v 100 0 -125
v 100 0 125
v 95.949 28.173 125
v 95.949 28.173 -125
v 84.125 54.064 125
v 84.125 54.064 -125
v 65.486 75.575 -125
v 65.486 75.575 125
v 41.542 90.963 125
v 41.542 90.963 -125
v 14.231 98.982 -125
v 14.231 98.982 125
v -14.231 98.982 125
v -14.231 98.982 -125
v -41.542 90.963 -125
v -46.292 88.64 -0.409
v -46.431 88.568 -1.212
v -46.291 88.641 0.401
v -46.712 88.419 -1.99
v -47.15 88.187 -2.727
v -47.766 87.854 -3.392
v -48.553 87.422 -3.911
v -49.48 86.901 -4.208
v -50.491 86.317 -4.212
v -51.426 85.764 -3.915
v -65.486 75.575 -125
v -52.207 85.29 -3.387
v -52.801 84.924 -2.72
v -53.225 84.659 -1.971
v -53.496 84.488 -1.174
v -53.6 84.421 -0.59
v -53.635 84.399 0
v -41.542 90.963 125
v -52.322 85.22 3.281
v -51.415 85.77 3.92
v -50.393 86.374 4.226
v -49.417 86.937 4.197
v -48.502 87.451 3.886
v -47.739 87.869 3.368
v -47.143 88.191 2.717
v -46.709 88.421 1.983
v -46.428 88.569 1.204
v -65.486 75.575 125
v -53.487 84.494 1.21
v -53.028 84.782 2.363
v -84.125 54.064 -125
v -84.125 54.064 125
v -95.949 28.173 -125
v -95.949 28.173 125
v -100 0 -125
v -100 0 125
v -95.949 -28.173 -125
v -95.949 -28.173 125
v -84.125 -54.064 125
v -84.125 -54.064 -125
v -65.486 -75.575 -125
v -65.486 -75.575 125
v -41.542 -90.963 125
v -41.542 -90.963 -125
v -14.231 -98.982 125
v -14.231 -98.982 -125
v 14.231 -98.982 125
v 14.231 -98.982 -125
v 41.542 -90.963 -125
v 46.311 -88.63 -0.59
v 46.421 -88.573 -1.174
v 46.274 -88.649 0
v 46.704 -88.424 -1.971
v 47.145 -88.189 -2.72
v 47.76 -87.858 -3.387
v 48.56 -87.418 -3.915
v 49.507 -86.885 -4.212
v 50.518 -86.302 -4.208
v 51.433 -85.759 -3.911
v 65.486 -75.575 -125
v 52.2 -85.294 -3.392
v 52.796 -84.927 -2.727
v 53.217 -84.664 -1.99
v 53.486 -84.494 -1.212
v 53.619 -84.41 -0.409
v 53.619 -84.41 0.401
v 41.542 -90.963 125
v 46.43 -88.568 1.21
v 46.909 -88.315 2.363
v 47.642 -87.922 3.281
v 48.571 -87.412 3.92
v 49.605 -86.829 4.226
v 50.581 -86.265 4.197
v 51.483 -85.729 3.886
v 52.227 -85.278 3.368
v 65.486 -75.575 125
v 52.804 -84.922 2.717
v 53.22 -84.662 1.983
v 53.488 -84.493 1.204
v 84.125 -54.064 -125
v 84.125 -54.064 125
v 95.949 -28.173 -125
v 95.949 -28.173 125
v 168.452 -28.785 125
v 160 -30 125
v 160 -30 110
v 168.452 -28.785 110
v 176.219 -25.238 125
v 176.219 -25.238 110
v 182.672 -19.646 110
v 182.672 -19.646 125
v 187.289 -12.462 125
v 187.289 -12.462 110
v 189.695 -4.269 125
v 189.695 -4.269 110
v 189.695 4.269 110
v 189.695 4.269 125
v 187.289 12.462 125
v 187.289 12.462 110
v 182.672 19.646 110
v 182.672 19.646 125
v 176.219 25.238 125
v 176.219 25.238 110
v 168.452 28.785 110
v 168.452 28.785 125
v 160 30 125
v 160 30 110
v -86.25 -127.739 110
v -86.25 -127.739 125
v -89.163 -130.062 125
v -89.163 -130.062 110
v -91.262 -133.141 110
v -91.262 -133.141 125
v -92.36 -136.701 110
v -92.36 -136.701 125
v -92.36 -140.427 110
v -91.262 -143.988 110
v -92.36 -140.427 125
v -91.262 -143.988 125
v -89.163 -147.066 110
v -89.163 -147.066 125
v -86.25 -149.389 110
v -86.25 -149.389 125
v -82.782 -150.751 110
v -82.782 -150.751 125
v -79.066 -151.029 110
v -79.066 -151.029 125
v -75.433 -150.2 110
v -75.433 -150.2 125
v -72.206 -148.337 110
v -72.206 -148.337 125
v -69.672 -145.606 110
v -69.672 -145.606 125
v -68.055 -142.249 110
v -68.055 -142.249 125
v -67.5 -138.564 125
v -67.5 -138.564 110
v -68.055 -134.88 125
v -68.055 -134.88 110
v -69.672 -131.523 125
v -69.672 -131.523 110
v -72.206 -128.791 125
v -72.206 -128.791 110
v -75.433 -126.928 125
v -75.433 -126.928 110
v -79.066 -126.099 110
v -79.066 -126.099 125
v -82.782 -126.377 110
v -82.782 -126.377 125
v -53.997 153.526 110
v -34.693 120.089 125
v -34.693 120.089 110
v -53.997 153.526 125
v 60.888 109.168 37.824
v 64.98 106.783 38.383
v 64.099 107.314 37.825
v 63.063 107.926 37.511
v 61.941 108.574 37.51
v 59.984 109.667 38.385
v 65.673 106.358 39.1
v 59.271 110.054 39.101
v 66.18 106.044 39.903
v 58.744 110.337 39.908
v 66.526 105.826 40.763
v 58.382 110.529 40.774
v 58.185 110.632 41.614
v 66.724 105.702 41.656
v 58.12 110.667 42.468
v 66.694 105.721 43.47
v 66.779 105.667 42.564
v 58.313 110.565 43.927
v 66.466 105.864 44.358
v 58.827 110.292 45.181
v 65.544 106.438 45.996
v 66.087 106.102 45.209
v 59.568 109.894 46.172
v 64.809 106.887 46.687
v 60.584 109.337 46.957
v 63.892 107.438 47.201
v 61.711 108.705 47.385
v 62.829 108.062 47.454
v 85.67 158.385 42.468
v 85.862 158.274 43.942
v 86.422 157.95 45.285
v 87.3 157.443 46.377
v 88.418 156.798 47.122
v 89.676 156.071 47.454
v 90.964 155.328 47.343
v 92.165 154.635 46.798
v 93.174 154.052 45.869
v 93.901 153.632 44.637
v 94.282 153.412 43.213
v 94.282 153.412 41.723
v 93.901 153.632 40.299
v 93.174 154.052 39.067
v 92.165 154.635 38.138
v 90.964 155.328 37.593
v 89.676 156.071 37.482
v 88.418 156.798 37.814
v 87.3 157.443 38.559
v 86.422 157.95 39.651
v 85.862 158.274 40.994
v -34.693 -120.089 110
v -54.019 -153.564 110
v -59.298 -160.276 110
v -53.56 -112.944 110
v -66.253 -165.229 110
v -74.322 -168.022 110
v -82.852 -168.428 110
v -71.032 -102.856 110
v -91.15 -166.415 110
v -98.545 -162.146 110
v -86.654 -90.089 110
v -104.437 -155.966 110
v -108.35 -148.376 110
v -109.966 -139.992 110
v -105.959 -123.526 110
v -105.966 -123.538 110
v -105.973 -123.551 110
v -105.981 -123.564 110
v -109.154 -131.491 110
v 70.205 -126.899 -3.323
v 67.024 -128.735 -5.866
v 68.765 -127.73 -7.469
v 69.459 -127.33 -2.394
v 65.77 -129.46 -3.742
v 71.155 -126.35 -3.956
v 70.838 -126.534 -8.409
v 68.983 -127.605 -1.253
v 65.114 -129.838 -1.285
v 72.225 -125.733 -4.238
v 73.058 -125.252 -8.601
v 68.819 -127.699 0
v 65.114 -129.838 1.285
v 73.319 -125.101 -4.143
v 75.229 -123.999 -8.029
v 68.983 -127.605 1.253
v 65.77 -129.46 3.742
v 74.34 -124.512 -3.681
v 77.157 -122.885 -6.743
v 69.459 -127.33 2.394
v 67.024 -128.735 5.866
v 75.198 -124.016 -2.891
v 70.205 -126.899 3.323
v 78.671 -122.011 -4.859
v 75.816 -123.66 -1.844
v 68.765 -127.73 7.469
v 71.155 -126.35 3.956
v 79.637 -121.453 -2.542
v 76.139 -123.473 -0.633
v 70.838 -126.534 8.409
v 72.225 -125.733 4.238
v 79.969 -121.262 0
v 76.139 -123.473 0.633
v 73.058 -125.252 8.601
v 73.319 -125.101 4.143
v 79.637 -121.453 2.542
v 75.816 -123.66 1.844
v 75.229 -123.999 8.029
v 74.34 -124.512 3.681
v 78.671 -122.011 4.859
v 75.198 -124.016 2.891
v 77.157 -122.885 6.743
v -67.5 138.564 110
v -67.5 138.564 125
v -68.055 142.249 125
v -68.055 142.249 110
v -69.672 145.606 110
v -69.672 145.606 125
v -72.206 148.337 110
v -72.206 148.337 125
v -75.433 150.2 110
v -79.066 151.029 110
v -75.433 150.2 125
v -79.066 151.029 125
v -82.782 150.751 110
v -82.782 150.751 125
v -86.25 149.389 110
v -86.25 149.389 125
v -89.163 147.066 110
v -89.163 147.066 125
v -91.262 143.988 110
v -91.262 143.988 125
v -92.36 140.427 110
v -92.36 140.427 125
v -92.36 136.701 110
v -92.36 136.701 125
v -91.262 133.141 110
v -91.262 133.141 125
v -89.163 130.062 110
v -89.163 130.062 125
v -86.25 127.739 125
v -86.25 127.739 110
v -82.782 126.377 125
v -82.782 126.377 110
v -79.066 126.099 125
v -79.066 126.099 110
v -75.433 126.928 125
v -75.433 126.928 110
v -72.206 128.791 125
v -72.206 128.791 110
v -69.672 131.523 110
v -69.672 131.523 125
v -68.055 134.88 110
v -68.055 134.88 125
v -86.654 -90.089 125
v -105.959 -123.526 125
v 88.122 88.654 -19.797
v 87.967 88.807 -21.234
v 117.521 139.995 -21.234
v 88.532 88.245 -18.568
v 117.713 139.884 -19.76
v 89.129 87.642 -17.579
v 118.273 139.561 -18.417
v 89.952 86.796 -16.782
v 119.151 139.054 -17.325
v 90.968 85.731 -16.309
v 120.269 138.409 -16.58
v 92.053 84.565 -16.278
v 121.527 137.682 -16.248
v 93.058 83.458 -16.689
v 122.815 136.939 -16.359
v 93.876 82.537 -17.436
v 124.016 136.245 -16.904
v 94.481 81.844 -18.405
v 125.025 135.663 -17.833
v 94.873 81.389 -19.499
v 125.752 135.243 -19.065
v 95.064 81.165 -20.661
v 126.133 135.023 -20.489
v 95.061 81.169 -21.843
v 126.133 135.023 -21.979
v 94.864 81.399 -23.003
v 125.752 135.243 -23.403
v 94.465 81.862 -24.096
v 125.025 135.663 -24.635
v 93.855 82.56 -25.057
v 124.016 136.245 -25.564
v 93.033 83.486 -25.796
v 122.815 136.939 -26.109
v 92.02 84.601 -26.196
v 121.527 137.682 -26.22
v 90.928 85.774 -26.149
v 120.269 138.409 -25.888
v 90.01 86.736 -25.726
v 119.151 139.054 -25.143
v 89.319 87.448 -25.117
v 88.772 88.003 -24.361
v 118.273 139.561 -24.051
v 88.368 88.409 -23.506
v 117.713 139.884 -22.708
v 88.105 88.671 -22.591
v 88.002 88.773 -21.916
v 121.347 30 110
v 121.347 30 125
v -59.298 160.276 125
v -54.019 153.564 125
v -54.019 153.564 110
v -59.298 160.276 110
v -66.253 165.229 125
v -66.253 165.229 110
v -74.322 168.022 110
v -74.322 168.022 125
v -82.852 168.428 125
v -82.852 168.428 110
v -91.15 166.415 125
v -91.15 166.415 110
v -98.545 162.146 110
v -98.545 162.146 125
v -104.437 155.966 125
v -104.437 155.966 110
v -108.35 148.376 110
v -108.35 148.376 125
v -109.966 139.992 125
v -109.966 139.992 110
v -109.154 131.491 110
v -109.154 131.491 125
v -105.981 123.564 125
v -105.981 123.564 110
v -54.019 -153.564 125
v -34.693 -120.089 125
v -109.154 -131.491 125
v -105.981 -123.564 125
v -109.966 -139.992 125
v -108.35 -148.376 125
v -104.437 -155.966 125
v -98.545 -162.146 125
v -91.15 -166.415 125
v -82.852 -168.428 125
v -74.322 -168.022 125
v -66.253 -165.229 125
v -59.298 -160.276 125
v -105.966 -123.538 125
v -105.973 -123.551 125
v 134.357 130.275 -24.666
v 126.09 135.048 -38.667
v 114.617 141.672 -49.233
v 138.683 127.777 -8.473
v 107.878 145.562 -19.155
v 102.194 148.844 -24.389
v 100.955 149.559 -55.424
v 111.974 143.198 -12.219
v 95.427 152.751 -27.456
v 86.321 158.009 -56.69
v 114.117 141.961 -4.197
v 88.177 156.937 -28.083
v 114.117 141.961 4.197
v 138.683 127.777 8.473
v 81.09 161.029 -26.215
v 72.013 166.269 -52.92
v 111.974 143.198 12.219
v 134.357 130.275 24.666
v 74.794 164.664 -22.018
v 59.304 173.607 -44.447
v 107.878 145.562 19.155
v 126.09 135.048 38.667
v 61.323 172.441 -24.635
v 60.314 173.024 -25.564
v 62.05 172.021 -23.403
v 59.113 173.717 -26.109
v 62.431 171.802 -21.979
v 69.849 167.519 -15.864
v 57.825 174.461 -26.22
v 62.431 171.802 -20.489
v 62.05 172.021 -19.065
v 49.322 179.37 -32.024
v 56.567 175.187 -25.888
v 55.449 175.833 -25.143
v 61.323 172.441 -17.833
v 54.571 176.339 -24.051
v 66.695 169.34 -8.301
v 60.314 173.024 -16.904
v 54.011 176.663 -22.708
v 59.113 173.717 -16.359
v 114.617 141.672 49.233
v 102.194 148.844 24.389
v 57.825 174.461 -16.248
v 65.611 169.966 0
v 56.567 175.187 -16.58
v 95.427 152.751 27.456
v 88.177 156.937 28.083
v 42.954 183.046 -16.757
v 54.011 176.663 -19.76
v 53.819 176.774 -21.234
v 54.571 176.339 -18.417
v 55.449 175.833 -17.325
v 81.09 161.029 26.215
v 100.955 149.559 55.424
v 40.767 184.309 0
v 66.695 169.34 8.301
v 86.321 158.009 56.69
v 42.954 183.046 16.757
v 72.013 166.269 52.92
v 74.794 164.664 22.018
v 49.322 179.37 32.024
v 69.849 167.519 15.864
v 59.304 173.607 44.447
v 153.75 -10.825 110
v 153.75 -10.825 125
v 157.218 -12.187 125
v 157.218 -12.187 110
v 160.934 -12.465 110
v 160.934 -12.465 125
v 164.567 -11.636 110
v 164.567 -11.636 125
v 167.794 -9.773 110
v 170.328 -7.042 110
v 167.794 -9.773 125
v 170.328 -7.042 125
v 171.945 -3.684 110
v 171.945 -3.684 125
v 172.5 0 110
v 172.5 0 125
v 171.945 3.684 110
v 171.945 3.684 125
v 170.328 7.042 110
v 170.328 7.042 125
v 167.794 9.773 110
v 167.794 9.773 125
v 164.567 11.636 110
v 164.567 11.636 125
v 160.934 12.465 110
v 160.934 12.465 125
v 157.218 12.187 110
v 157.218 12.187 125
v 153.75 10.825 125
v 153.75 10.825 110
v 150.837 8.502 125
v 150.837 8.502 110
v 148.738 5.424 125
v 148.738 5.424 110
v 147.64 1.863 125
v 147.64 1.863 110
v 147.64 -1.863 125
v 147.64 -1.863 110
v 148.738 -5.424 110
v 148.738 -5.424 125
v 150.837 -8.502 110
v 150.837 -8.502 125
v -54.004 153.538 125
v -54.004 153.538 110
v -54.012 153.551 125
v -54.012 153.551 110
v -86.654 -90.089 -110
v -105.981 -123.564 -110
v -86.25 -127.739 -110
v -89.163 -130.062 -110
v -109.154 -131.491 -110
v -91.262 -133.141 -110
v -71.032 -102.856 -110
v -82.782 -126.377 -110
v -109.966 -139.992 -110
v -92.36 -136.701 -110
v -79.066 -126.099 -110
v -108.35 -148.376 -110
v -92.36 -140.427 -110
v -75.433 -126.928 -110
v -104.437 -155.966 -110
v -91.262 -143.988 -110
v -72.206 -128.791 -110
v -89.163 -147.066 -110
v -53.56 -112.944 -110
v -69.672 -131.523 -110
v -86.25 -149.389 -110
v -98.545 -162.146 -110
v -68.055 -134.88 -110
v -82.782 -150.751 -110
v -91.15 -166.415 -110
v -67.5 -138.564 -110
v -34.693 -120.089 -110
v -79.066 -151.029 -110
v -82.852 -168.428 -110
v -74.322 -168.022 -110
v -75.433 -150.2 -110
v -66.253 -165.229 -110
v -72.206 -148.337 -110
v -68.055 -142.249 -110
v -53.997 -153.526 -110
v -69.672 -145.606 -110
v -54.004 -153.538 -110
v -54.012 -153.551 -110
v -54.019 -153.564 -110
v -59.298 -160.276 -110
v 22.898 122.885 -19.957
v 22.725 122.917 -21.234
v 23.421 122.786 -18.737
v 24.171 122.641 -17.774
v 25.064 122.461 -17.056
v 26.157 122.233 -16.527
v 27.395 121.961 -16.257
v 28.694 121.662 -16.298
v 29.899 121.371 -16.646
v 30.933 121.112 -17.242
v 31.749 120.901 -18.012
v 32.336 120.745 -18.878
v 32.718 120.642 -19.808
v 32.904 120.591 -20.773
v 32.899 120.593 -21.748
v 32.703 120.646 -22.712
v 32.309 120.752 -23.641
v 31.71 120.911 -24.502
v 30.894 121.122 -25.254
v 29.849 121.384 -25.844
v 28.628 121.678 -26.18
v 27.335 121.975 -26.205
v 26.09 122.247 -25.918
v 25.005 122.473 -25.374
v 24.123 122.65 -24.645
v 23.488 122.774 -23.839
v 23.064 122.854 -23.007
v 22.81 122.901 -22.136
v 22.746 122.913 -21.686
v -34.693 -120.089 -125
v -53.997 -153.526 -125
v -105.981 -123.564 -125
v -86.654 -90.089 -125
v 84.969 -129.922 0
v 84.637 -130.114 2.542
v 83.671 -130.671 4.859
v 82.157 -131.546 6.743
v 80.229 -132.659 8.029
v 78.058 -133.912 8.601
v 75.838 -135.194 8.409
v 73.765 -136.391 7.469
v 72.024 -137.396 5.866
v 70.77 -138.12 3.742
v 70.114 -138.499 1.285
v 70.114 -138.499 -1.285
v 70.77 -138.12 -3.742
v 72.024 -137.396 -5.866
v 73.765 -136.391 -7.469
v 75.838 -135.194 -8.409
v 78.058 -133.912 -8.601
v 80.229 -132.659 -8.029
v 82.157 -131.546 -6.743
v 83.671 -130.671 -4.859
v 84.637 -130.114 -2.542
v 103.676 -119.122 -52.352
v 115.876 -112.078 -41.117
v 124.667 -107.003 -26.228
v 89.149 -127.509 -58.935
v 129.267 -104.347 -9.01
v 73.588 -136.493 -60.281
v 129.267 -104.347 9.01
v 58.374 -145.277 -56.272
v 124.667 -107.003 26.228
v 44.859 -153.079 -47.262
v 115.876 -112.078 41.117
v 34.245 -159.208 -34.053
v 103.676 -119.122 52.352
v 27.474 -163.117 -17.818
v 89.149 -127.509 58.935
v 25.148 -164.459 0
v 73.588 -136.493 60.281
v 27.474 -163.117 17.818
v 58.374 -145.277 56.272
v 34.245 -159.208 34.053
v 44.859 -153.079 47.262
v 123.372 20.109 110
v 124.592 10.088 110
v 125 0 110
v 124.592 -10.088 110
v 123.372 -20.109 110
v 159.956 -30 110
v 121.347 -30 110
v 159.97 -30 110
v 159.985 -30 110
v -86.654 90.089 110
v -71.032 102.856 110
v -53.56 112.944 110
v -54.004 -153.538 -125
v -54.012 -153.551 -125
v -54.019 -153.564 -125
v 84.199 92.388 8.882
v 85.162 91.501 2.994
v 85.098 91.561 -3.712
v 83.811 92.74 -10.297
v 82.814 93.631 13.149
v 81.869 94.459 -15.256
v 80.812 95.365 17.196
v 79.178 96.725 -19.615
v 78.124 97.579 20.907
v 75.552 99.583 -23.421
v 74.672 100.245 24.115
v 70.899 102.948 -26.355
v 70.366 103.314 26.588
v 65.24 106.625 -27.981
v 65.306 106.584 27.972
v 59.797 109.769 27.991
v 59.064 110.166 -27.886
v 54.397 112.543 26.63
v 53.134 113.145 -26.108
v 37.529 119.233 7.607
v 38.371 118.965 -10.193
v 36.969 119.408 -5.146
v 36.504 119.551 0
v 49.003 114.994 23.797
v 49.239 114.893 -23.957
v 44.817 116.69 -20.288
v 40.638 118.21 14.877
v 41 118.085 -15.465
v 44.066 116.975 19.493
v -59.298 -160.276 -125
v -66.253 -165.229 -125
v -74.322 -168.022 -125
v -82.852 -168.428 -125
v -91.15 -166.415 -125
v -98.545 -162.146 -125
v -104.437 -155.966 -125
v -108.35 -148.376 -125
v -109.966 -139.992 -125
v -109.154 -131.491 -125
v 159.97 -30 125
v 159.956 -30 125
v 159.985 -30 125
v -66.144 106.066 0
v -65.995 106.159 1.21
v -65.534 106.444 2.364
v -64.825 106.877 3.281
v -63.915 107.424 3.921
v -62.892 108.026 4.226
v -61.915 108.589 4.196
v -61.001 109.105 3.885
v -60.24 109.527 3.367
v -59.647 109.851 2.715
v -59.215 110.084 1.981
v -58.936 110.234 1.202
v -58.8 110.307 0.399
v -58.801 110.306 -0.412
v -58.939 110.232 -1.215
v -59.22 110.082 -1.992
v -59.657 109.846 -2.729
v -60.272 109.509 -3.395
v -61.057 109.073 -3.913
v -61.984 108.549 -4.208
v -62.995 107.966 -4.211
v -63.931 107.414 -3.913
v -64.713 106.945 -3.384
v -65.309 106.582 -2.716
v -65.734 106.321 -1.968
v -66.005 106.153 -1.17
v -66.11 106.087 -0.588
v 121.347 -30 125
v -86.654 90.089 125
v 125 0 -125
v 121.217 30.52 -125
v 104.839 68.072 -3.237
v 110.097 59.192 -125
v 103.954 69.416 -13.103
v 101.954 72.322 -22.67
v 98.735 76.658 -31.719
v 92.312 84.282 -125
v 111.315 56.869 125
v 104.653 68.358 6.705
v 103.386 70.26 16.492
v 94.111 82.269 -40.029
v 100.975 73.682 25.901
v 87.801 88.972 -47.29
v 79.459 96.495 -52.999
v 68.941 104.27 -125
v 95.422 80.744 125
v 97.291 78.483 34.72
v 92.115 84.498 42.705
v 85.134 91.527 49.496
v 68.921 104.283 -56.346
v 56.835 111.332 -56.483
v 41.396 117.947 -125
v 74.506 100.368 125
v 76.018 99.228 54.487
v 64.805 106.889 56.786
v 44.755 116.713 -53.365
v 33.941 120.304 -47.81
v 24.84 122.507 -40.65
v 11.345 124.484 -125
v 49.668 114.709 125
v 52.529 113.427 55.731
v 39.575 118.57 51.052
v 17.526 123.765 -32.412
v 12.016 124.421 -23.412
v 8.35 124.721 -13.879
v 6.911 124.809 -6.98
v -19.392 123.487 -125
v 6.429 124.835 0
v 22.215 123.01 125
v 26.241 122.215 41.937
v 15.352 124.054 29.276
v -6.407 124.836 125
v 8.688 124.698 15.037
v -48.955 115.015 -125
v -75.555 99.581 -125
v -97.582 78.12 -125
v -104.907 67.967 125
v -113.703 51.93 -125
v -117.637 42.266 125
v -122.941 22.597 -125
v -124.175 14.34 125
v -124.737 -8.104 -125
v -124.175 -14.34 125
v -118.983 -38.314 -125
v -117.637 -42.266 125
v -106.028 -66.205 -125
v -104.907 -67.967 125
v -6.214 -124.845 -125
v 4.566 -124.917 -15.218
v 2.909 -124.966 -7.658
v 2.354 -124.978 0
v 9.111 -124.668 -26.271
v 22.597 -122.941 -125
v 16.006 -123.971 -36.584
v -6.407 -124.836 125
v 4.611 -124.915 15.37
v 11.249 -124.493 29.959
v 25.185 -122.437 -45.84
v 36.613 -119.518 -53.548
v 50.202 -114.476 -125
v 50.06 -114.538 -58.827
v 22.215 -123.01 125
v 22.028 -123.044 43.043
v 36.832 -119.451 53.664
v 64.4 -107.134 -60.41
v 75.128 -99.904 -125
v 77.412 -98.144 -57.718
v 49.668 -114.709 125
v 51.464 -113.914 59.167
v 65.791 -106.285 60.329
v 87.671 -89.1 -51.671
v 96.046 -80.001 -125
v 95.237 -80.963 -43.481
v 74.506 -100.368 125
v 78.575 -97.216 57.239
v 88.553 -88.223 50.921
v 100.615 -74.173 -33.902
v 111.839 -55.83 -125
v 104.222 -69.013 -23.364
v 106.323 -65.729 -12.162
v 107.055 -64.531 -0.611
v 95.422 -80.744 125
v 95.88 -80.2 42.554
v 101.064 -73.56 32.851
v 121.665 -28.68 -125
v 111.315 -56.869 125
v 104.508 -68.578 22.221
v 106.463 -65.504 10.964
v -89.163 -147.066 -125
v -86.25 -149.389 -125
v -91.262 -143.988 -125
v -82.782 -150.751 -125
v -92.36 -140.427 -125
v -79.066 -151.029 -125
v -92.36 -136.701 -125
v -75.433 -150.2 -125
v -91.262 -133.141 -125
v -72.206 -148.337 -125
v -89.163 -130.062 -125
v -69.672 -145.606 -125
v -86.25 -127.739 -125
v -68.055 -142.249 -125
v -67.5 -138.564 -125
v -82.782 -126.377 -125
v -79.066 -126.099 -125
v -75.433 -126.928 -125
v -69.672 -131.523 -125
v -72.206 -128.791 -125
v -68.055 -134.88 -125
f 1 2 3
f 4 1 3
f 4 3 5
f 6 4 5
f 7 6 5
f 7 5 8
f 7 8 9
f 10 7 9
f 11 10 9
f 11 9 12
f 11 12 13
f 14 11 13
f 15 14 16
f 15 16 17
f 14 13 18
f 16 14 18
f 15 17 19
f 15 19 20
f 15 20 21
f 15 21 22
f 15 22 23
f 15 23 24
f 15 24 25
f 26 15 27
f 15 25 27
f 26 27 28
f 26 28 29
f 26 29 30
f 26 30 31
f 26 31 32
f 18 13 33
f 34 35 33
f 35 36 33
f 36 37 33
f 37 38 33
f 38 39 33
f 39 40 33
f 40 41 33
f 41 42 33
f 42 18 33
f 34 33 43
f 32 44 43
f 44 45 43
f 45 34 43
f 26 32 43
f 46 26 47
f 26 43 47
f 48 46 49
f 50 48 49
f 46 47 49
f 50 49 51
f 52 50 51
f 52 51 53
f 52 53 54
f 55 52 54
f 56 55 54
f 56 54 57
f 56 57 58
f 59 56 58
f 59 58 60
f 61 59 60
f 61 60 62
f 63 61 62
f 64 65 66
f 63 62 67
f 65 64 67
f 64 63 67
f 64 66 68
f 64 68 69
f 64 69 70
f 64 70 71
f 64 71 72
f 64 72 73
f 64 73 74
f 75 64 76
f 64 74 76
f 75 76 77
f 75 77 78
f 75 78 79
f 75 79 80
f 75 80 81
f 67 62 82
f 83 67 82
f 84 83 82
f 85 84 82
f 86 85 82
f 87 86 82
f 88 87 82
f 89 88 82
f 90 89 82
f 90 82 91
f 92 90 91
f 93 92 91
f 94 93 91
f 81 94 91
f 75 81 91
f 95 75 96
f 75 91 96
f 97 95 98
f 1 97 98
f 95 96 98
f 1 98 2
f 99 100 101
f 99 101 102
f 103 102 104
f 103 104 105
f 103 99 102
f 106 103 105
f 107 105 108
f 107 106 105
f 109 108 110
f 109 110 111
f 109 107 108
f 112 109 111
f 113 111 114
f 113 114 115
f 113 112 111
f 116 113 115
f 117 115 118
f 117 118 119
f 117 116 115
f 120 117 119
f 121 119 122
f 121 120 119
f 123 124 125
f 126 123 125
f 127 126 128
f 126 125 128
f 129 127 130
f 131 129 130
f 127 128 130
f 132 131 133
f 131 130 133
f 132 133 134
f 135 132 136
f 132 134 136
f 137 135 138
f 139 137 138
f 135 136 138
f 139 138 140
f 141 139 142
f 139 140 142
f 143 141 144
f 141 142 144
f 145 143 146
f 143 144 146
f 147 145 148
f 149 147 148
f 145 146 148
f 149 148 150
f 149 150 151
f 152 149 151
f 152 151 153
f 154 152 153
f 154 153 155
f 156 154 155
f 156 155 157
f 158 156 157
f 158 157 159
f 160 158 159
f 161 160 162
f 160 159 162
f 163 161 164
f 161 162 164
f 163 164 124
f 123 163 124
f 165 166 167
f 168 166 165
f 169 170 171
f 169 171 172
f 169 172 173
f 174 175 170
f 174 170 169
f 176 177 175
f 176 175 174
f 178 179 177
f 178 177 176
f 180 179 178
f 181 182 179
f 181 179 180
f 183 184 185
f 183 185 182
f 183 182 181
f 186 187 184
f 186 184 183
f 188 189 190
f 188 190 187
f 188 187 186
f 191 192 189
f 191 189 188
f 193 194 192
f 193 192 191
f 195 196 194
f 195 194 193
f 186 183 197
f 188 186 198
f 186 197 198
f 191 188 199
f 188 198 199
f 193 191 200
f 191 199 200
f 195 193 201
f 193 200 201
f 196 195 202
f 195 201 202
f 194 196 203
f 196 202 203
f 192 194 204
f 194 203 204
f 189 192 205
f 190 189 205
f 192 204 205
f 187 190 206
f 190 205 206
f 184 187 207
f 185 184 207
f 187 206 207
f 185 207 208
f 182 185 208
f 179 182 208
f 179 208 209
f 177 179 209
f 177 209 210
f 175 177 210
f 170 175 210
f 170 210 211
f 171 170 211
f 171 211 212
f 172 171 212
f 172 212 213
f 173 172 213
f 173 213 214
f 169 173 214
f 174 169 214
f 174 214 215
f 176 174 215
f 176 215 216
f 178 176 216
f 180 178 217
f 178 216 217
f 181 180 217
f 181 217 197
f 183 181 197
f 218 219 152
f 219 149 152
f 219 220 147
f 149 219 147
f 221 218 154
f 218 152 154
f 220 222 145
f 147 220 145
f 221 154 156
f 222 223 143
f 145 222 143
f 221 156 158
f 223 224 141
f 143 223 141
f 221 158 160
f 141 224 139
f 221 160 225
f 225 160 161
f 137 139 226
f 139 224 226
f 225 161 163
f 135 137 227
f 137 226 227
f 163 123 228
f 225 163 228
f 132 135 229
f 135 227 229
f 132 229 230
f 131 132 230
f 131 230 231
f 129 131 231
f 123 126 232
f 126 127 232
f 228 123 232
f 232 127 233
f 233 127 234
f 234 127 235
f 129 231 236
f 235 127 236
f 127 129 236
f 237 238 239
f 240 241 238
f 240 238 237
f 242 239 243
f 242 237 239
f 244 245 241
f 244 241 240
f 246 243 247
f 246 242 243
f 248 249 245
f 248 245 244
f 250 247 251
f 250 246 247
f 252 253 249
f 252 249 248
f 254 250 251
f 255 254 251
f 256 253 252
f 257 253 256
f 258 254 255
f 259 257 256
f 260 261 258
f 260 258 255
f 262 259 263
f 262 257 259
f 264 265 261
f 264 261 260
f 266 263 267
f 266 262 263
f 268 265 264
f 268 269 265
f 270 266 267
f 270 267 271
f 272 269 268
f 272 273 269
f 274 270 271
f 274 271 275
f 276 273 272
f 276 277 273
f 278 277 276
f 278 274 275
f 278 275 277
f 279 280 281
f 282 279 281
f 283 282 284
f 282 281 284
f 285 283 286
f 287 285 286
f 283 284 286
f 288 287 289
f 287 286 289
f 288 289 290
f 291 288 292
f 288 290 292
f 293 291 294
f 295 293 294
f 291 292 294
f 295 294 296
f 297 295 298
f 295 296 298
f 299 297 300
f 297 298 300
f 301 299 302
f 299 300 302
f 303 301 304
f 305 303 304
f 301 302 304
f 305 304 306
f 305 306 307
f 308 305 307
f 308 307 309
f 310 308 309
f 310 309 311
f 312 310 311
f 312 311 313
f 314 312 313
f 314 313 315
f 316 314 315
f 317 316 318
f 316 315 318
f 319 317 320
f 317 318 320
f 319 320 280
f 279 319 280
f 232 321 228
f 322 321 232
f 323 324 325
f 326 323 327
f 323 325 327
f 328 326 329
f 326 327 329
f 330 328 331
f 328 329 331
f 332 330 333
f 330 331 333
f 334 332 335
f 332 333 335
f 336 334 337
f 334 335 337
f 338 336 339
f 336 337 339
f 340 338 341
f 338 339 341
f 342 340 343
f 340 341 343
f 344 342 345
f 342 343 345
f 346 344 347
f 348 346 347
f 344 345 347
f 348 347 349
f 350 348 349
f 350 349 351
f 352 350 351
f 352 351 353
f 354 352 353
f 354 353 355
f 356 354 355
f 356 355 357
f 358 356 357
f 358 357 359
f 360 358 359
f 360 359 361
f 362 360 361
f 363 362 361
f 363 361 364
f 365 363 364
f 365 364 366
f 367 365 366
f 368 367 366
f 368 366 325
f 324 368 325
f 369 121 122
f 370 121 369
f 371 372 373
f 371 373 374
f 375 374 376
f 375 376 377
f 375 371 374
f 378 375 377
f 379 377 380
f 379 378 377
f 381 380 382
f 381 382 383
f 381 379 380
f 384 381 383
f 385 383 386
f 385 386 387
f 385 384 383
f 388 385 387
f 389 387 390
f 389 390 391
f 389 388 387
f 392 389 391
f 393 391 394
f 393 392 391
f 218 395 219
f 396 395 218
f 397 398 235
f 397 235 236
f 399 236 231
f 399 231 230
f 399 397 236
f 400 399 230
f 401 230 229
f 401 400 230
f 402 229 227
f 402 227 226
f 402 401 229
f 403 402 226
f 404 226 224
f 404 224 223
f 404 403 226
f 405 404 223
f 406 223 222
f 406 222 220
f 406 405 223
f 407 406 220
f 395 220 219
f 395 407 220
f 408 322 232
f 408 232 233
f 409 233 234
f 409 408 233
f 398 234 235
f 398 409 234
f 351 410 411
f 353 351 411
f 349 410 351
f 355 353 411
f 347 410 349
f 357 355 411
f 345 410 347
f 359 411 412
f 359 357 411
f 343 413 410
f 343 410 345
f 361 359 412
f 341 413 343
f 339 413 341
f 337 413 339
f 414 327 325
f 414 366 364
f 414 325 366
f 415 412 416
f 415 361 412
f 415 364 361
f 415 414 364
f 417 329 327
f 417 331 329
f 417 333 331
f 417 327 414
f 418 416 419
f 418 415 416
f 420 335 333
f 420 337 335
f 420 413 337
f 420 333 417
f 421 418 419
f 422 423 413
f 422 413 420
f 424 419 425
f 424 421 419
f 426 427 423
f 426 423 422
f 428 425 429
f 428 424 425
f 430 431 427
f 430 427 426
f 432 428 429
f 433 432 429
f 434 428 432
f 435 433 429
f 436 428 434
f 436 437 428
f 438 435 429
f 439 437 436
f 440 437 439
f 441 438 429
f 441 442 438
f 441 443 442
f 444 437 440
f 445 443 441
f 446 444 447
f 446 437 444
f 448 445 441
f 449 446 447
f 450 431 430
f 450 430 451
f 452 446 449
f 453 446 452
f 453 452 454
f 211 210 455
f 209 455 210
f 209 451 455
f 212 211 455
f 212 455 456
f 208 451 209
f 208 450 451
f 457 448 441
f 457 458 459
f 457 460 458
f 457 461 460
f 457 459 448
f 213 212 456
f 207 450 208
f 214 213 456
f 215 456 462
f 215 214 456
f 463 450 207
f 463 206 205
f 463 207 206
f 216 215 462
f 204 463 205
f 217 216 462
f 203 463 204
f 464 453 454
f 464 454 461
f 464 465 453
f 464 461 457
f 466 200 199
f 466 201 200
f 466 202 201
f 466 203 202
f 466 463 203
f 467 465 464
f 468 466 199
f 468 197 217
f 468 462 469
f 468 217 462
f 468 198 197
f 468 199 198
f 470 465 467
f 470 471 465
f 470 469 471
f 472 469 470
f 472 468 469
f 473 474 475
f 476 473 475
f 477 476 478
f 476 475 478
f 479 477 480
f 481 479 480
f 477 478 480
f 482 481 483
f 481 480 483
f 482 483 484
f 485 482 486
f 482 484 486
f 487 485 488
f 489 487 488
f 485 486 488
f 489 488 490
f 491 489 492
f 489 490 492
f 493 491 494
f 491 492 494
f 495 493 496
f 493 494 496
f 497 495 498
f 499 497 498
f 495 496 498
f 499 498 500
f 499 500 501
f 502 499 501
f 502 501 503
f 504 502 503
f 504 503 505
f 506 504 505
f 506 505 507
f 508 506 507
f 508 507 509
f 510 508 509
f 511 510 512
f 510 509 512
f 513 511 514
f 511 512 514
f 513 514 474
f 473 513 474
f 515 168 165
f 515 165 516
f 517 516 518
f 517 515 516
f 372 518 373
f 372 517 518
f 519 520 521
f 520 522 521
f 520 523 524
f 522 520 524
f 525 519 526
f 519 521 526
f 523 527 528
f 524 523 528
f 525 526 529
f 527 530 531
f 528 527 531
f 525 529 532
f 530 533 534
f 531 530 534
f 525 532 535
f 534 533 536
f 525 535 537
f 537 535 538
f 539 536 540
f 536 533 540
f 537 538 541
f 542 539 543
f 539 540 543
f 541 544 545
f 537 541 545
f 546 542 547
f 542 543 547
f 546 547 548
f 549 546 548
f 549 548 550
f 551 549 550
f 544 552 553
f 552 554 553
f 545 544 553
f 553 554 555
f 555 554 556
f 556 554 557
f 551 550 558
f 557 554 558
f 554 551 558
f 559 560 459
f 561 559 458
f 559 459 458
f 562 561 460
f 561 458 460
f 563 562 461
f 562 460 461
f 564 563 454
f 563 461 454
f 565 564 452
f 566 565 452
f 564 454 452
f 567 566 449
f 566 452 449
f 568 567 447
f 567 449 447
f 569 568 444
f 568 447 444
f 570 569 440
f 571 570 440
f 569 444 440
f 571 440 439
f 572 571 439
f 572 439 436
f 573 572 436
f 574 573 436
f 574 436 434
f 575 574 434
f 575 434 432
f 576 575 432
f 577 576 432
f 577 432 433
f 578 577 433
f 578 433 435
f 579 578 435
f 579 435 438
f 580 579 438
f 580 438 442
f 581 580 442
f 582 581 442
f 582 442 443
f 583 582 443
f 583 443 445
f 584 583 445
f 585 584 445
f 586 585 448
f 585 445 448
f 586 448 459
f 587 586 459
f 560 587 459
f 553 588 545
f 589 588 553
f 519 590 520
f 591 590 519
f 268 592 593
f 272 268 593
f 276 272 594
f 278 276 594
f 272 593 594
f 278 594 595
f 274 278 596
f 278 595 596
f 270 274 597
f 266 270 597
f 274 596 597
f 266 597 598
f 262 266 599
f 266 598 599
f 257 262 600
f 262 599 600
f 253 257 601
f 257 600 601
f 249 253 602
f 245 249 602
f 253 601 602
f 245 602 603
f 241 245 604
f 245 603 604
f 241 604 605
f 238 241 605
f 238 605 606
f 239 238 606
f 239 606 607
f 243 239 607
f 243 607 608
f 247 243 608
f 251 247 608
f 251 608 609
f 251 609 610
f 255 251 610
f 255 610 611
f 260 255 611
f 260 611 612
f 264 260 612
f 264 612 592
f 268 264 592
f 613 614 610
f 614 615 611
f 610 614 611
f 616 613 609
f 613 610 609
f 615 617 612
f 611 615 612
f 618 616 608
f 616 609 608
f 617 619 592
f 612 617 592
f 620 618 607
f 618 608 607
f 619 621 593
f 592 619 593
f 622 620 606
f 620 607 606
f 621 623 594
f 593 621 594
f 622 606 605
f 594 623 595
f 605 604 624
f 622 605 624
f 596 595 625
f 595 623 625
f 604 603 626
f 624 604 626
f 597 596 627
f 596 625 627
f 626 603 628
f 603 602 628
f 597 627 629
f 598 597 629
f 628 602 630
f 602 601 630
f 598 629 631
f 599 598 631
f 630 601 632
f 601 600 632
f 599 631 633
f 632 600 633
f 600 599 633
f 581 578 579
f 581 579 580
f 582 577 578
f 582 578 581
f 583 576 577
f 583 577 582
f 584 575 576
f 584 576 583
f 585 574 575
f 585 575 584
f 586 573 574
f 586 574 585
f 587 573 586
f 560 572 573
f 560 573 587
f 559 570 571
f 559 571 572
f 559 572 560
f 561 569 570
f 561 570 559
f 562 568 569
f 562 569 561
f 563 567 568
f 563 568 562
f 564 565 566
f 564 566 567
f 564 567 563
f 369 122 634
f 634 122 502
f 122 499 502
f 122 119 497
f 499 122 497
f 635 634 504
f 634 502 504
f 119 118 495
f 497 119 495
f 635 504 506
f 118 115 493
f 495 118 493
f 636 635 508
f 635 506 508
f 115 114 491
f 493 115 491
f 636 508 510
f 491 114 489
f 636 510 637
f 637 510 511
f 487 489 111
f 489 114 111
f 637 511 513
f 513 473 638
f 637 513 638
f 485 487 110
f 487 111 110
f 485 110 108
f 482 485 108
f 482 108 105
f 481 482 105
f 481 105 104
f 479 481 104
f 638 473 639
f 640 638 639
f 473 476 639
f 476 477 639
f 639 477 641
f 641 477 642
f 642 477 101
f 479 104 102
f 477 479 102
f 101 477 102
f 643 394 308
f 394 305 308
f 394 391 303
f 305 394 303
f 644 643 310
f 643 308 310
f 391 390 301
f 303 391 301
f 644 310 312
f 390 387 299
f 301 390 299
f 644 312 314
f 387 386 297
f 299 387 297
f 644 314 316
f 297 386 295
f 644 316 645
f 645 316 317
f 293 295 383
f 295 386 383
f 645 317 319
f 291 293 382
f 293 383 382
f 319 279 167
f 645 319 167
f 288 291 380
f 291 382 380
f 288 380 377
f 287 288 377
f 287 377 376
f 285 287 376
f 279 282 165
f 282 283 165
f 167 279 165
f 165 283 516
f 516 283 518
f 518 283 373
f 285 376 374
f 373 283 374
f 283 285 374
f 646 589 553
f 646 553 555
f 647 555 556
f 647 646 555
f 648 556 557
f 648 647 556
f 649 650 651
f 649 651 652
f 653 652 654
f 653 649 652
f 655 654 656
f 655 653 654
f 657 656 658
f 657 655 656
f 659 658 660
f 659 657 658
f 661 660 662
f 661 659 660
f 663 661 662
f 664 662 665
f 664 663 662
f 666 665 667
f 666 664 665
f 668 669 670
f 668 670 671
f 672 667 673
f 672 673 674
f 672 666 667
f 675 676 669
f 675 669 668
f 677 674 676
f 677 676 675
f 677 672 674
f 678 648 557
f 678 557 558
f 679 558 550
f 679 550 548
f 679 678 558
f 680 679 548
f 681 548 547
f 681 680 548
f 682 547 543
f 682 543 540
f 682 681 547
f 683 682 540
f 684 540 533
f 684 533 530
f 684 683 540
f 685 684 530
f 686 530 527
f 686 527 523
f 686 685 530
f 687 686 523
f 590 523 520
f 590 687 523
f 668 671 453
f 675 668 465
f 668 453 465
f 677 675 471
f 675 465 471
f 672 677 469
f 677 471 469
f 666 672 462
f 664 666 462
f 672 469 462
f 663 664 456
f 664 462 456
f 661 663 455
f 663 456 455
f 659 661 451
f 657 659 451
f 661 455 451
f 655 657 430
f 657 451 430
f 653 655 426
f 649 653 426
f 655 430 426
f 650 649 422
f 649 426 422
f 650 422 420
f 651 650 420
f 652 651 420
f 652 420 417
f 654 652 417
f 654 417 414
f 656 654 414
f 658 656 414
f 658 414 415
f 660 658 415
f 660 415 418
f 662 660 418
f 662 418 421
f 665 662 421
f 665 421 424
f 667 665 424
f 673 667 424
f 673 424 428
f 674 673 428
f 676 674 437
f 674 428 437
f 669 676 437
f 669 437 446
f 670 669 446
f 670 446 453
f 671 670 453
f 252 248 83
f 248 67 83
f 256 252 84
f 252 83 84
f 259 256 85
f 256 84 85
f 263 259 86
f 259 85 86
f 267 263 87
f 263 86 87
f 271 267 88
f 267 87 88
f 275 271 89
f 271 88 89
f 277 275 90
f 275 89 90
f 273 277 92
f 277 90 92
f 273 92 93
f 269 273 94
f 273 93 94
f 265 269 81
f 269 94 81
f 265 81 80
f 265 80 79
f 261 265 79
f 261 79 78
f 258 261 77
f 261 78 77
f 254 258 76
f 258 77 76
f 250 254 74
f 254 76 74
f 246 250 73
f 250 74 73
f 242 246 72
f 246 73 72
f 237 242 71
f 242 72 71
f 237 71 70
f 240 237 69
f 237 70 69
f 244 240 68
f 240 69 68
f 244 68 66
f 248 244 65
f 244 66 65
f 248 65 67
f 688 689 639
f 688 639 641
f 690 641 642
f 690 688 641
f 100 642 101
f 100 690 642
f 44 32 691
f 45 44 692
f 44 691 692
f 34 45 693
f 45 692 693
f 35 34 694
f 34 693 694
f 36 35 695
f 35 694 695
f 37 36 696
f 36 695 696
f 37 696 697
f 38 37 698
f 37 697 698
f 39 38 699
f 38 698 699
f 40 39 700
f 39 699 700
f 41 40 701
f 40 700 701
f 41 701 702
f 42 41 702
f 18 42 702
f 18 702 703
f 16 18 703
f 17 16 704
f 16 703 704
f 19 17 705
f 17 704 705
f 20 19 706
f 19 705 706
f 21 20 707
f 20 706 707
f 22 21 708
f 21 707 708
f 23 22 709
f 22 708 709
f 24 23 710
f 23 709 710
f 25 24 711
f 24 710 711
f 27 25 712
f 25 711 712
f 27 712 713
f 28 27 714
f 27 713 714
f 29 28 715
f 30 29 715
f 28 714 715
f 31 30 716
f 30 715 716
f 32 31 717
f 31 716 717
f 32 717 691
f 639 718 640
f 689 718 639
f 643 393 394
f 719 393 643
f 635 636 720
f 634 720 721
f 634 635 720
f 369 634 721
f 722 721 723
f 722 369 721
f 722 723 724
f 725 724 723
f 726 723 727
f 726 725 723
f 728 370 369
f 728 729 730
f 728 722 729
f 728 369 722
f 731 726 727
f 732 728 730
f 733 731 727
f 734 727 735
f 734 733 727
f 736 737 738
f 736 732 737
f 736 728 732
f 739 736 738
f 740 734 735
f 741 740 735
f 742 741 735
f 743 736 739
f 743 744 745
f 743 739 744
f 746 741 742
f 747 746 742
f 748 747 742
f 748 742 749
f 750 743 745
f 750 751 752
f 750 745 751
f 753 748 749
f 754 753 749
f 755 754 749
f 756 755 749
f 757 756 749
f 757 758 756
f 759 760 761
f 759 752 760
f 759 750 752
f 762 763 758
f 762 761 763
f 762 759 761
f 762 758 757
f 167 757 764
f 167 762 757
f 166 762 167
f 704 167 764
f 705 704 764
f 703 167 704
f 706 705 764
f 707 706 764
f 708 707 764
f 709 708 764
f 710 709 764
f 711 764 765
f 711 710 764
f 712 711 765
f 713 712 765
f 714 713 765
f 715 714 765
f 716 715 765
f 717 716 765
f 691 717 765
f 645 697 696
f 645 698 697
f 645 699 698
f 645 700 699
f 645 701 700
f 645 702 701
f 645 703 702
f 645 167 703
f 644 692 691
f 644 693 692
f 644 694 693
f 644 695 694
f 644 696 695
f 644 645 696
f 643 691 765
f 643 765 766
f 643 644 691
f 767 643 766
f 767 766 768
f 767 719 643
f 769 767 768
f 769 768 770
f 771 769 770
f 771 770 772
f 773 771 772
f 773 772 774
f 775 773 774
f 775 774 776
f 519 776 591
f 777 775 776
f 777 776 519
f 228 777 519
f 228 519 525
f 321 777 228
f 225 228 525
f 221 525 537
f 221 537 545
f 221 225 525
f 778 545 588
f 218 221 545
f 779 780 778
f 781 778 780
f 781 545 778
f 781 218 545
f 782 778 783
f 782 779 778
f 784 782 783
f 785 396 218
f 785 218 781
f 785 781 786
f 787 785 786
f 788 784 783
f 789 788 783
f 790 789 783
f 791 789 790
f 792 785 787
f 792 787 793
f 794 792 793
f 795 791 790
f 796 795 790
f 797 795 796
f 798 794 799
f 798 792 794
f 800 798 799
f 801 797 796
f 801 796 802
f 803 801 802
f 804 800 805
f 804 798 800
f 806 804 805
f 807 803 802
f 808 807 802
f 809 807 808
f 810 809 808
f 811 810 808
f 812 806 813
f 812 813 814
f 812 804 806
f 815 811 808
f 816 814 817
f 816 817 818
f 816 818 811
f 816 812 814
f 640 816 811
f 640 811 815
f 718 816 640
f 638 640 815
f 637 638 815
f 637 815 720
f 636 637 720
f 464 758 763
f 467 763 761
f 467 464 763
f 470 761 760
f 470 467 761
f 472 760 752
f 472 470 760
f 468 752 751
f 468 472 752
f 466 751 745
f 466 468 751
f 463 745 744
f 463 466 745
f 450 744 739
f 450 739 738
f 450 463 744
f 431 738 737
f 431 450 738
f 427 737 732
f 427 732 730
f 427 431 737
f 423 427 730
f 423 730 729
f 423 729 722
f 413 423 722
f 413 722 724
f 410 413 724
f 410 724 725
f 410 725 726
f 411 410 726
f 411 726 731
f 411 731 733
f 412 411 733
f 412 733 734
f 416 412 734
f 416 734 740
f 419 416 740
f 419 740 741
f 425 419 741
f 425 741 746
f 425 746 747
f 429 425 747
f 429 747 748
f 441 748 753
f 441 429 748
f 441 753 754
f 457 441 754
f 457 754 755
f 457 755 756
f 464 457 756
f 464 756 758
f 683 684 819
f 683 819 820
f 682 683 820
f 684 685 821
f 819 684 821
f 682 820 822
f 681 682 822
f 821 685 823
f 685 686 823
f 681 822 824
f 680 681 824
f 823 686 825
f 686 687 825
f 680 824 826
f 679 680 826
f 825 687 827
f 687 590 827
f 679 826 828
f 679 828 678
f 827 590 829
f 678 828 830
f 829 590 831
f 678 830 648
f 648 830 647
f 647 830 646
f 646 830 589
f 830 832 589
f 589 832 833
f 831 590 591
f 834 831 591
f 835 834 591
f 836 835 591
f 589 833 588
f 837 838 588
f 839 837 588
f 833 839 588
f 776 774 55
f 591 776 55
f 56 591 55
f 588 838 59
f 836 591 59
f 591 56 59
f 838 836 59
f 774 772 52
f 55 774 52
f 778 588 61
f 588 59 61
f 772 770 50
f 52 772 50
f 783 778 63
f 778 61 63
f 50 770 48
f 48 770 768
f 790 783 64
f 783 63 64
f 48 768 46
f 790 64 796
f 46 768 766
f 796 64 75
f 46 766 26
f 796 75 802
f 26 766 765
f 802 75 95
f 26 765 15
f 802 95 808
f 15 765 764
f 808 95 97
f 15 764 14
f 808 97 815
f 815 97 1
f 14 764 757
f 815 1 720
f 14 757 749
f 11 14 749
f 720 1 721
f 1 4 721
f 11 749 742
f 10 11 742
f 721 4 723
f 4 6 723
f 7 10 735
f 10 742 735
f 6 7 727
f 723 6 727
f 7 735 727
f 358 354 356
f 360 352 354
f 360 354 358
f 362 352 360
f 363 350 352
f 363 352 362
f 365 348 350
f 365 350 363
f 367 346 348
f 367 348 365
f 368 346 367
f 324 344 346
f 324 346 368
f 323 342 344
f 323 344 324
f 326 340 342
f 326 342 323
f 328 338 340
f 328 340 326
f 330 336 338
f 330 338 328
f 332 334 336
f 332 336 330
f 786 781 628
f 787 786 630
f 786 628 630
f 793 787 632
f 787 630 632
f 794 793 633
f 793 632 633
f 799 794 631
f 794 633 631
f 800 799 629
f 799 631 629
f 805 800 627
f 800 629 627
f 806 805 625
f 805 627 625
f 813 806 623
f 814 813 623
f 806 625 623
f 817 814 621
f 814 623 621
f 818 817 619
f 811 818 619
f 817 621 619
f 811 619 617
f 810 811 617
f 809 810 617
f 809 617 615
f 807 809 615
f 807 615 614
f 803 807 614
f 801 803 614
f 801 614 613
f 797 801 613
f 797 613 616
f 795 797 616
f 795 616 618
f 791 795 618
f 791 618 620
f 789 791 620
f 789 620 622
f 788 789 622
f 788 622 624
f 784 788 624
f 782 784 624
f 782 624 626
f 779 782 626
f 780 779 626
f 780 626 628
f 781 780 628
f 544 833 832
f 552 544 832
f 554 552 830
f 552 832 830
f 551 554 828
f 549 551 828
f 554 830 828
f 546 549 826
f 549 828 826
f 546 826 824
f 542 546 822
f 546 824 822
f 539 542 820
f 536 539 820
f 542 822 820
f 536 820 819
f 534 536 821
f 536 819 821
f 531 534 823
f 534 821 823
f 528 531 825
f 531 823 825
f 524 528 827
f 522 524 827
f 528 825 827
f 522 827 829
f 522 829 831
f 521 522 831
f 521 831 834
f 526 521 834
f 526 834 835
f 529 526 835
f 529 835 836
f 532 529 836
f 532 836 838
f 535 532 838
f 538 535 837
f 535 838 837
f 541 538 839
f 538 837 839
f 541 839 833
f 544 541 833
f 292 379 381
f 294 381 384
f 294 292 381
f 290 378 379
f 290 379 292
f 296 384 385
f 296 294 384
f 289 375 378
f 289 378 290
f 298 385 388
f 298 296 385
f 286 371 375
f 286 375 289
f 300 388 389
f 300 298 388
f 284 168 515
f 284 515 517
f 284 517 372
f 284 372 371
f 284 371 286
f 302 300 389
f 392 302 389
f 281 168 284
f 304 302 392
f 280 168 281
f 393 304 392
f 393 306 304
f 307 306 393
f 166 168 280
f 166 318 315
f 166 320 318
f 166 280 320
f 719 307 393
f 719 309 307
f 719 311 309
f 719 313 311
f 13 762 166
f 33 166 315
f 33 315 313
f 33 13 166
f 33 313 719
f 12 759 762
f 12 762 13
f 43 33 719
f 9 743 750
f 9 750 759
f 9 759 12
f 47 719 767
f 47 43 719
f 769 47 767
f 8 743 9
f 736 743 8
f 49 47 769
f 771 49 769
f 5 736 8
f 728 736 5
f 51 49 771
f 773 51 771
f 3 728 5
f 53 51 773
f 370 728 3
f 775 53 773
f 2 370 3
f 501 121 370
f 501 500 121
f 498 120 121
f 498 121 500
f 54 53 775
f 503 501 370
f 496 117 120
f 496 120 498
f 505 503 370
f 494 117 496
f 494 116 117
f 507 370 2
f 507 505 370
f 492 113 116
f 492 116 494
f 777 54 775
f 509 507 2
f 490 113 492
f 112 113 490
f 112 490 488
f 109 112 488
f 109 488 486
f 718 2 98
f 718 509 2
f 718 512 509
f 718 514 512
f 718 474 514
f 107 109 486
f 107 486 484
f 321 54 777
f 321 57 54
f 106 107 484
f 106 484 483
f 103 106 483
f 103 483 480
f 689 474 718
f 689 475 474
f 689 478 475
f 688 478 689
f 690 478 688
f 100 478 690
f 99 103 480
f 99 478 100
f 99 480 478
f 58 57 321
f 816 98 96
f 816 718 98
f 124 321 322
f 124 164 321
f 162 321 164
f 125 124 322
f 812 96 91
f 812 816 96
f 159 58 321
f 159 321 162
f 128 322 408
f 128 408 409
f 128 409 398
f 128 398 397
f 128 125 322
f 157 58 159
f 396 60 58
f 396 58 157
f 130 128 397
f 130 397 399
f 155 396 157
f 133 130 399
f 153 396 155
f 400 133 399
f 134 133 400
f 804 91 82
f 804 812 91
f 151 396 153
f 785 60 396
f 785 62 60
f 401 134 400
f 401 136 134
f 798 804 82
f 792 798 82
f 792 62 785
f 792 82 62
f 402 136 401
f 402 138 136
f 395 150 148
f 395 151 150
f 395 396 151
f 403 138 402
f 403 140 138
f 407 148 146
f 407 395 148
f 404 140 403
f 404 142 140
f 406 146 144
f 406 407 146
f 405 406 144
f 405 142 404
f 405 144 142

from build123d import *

# Parameters (mm, degrees)
F1_R             = 125
F1_R_2           = 100
F2_DEPTH         = 250
F3_R             = 12.5
F4_DEPTH         = 15
F4_COPIES_COUNT  = 3
F4_COPIES1_COUNT = 2
F10_R            = 56.8493867215
F10_R_2          = 5
F10_R_3          = 28.1619206838
F11_DEPTH        = 68.6754869442
F15_R            = 60.4503373428
F18_D            = 8.5
F18_CBORE_D      = 17.25
F18_CBORE_DEPTH  = 10


# Not quite as in the source:
# - ends of sketch curves that miss each other by under 0.0002 mm in the source are joined
# - a pattern or mirror of a feature is missing from the dataset's text; its kind, count and spacing are read off the source's solid


with BuildPart() as f2:
    # F1 (on offset) → F2 (new body)
    with BuildSketch(Plane.XY.offset(125)):
        Circle(F1_R)
        Circle(F1_R_2, mode=Mode.SUBTRACT)
    extrude(amount=-F2_DEPTH)

    # F3 (on face) → F4 (join)
    with BuildSketch(Plane.XY.offset(125)):
        with BuildLine():
            Line((-105.9807621135, 123.5640646055), (-86.6540676111, 90.0892477849))
            ThreePointArc((-86.6540676111, 90.0892477849), (-62.5, 108.2531754731), (-34.692543384, 120.0892477849))
            Line((-34.692543384, 120.0892477849), (-53.9970505647, 153.5256350369))
            ThreePointArc((-53.9970505647, 153.5256350369), (-54.008151328, 153.5448457136), (-54.0192378865, 153.5640646055))
            ThreePointArc((-54.0192378865, 153.5640646055), (-95, 164.544826719), (-105.9807621135, 123.5640646055))
        make_face()
        with Locations((-80, 138.5640646055)):
            Circle(F3_R, mode=Mode.SUBTRACT)
    f4 = extrude(amount=-F4_DEPTH)

    # F4_copies: F4 ×3 about axis
    f4_copies_axis = Axis((0, 0, 0), (0, 0, 1))
    for i in range(1, F4_COPIES_COUNT):
        add(f4.rotate(f4_copies_axis, i * 360 / F4_COPIES_COUNT))

    # F4_copies1: F4 ×2 about axis
    f4_copies1_axis = Axis((0, 0, 0), (1, 0, 0))
    for i in range(1, F4_COPIES1_COUNT):
        add(f4.rotate(f4_copies1_axis, i * 360 / F4_COPIES1_COUNT))

    # F10 (on offset) → F11 (join, through all)
    with BuildSketch(Plane(origin=(90, 155.8845726812, 0), x_dir=(-0.8660254038, 0.5, 0), z_dir=(0.5, 0.8660254038, 0))):
        Circle(F10_R)
        with Locations((-36.7784088222, -21.2340242338)):
            Circle(F10_R_2, mode=Mode.SUBTRACT)
        with Locations((36.7784088222, -21.2340242338)):
            Circle(F10_R_2, mode=Mode.SUBTRACT)
        Circle(F10_R_3, mode=Mode.SUBTRACT)
        with Locations((0, 42.4680484677)):
            Circle(F10_R_2, mode=Mode.SUBTRACT)
    extrude(amount=-F11_DEPTH)

    # F15 (on offset) → F16 (join, up to the next surface of F2)
    with BuildSketch(Plane(origin=(77.4998450043, -134.2344088806, 0), x_dir=(-0.8660265969, -0.4999979334, 0), z_dir=(-0.4999979334, 0.8660265969, 0))):
        Circle(F15_R)
    extrude(until=Until.NEXT)

    # F18 (through all)
    with Locations(Plane(origin=(77.4998450043, -134.2344088806, 0), x_dir=(0.8660265969, 0.4999979334, 0), z_dir=(0.4999979334, -0.8660265969, 0))):
        with Locations((0, 0)):
            CounterBoreHole(F18_D / 2, F18_CBORE_D / 2, F18_CBORE_DEPTH)


solid = f2.part
